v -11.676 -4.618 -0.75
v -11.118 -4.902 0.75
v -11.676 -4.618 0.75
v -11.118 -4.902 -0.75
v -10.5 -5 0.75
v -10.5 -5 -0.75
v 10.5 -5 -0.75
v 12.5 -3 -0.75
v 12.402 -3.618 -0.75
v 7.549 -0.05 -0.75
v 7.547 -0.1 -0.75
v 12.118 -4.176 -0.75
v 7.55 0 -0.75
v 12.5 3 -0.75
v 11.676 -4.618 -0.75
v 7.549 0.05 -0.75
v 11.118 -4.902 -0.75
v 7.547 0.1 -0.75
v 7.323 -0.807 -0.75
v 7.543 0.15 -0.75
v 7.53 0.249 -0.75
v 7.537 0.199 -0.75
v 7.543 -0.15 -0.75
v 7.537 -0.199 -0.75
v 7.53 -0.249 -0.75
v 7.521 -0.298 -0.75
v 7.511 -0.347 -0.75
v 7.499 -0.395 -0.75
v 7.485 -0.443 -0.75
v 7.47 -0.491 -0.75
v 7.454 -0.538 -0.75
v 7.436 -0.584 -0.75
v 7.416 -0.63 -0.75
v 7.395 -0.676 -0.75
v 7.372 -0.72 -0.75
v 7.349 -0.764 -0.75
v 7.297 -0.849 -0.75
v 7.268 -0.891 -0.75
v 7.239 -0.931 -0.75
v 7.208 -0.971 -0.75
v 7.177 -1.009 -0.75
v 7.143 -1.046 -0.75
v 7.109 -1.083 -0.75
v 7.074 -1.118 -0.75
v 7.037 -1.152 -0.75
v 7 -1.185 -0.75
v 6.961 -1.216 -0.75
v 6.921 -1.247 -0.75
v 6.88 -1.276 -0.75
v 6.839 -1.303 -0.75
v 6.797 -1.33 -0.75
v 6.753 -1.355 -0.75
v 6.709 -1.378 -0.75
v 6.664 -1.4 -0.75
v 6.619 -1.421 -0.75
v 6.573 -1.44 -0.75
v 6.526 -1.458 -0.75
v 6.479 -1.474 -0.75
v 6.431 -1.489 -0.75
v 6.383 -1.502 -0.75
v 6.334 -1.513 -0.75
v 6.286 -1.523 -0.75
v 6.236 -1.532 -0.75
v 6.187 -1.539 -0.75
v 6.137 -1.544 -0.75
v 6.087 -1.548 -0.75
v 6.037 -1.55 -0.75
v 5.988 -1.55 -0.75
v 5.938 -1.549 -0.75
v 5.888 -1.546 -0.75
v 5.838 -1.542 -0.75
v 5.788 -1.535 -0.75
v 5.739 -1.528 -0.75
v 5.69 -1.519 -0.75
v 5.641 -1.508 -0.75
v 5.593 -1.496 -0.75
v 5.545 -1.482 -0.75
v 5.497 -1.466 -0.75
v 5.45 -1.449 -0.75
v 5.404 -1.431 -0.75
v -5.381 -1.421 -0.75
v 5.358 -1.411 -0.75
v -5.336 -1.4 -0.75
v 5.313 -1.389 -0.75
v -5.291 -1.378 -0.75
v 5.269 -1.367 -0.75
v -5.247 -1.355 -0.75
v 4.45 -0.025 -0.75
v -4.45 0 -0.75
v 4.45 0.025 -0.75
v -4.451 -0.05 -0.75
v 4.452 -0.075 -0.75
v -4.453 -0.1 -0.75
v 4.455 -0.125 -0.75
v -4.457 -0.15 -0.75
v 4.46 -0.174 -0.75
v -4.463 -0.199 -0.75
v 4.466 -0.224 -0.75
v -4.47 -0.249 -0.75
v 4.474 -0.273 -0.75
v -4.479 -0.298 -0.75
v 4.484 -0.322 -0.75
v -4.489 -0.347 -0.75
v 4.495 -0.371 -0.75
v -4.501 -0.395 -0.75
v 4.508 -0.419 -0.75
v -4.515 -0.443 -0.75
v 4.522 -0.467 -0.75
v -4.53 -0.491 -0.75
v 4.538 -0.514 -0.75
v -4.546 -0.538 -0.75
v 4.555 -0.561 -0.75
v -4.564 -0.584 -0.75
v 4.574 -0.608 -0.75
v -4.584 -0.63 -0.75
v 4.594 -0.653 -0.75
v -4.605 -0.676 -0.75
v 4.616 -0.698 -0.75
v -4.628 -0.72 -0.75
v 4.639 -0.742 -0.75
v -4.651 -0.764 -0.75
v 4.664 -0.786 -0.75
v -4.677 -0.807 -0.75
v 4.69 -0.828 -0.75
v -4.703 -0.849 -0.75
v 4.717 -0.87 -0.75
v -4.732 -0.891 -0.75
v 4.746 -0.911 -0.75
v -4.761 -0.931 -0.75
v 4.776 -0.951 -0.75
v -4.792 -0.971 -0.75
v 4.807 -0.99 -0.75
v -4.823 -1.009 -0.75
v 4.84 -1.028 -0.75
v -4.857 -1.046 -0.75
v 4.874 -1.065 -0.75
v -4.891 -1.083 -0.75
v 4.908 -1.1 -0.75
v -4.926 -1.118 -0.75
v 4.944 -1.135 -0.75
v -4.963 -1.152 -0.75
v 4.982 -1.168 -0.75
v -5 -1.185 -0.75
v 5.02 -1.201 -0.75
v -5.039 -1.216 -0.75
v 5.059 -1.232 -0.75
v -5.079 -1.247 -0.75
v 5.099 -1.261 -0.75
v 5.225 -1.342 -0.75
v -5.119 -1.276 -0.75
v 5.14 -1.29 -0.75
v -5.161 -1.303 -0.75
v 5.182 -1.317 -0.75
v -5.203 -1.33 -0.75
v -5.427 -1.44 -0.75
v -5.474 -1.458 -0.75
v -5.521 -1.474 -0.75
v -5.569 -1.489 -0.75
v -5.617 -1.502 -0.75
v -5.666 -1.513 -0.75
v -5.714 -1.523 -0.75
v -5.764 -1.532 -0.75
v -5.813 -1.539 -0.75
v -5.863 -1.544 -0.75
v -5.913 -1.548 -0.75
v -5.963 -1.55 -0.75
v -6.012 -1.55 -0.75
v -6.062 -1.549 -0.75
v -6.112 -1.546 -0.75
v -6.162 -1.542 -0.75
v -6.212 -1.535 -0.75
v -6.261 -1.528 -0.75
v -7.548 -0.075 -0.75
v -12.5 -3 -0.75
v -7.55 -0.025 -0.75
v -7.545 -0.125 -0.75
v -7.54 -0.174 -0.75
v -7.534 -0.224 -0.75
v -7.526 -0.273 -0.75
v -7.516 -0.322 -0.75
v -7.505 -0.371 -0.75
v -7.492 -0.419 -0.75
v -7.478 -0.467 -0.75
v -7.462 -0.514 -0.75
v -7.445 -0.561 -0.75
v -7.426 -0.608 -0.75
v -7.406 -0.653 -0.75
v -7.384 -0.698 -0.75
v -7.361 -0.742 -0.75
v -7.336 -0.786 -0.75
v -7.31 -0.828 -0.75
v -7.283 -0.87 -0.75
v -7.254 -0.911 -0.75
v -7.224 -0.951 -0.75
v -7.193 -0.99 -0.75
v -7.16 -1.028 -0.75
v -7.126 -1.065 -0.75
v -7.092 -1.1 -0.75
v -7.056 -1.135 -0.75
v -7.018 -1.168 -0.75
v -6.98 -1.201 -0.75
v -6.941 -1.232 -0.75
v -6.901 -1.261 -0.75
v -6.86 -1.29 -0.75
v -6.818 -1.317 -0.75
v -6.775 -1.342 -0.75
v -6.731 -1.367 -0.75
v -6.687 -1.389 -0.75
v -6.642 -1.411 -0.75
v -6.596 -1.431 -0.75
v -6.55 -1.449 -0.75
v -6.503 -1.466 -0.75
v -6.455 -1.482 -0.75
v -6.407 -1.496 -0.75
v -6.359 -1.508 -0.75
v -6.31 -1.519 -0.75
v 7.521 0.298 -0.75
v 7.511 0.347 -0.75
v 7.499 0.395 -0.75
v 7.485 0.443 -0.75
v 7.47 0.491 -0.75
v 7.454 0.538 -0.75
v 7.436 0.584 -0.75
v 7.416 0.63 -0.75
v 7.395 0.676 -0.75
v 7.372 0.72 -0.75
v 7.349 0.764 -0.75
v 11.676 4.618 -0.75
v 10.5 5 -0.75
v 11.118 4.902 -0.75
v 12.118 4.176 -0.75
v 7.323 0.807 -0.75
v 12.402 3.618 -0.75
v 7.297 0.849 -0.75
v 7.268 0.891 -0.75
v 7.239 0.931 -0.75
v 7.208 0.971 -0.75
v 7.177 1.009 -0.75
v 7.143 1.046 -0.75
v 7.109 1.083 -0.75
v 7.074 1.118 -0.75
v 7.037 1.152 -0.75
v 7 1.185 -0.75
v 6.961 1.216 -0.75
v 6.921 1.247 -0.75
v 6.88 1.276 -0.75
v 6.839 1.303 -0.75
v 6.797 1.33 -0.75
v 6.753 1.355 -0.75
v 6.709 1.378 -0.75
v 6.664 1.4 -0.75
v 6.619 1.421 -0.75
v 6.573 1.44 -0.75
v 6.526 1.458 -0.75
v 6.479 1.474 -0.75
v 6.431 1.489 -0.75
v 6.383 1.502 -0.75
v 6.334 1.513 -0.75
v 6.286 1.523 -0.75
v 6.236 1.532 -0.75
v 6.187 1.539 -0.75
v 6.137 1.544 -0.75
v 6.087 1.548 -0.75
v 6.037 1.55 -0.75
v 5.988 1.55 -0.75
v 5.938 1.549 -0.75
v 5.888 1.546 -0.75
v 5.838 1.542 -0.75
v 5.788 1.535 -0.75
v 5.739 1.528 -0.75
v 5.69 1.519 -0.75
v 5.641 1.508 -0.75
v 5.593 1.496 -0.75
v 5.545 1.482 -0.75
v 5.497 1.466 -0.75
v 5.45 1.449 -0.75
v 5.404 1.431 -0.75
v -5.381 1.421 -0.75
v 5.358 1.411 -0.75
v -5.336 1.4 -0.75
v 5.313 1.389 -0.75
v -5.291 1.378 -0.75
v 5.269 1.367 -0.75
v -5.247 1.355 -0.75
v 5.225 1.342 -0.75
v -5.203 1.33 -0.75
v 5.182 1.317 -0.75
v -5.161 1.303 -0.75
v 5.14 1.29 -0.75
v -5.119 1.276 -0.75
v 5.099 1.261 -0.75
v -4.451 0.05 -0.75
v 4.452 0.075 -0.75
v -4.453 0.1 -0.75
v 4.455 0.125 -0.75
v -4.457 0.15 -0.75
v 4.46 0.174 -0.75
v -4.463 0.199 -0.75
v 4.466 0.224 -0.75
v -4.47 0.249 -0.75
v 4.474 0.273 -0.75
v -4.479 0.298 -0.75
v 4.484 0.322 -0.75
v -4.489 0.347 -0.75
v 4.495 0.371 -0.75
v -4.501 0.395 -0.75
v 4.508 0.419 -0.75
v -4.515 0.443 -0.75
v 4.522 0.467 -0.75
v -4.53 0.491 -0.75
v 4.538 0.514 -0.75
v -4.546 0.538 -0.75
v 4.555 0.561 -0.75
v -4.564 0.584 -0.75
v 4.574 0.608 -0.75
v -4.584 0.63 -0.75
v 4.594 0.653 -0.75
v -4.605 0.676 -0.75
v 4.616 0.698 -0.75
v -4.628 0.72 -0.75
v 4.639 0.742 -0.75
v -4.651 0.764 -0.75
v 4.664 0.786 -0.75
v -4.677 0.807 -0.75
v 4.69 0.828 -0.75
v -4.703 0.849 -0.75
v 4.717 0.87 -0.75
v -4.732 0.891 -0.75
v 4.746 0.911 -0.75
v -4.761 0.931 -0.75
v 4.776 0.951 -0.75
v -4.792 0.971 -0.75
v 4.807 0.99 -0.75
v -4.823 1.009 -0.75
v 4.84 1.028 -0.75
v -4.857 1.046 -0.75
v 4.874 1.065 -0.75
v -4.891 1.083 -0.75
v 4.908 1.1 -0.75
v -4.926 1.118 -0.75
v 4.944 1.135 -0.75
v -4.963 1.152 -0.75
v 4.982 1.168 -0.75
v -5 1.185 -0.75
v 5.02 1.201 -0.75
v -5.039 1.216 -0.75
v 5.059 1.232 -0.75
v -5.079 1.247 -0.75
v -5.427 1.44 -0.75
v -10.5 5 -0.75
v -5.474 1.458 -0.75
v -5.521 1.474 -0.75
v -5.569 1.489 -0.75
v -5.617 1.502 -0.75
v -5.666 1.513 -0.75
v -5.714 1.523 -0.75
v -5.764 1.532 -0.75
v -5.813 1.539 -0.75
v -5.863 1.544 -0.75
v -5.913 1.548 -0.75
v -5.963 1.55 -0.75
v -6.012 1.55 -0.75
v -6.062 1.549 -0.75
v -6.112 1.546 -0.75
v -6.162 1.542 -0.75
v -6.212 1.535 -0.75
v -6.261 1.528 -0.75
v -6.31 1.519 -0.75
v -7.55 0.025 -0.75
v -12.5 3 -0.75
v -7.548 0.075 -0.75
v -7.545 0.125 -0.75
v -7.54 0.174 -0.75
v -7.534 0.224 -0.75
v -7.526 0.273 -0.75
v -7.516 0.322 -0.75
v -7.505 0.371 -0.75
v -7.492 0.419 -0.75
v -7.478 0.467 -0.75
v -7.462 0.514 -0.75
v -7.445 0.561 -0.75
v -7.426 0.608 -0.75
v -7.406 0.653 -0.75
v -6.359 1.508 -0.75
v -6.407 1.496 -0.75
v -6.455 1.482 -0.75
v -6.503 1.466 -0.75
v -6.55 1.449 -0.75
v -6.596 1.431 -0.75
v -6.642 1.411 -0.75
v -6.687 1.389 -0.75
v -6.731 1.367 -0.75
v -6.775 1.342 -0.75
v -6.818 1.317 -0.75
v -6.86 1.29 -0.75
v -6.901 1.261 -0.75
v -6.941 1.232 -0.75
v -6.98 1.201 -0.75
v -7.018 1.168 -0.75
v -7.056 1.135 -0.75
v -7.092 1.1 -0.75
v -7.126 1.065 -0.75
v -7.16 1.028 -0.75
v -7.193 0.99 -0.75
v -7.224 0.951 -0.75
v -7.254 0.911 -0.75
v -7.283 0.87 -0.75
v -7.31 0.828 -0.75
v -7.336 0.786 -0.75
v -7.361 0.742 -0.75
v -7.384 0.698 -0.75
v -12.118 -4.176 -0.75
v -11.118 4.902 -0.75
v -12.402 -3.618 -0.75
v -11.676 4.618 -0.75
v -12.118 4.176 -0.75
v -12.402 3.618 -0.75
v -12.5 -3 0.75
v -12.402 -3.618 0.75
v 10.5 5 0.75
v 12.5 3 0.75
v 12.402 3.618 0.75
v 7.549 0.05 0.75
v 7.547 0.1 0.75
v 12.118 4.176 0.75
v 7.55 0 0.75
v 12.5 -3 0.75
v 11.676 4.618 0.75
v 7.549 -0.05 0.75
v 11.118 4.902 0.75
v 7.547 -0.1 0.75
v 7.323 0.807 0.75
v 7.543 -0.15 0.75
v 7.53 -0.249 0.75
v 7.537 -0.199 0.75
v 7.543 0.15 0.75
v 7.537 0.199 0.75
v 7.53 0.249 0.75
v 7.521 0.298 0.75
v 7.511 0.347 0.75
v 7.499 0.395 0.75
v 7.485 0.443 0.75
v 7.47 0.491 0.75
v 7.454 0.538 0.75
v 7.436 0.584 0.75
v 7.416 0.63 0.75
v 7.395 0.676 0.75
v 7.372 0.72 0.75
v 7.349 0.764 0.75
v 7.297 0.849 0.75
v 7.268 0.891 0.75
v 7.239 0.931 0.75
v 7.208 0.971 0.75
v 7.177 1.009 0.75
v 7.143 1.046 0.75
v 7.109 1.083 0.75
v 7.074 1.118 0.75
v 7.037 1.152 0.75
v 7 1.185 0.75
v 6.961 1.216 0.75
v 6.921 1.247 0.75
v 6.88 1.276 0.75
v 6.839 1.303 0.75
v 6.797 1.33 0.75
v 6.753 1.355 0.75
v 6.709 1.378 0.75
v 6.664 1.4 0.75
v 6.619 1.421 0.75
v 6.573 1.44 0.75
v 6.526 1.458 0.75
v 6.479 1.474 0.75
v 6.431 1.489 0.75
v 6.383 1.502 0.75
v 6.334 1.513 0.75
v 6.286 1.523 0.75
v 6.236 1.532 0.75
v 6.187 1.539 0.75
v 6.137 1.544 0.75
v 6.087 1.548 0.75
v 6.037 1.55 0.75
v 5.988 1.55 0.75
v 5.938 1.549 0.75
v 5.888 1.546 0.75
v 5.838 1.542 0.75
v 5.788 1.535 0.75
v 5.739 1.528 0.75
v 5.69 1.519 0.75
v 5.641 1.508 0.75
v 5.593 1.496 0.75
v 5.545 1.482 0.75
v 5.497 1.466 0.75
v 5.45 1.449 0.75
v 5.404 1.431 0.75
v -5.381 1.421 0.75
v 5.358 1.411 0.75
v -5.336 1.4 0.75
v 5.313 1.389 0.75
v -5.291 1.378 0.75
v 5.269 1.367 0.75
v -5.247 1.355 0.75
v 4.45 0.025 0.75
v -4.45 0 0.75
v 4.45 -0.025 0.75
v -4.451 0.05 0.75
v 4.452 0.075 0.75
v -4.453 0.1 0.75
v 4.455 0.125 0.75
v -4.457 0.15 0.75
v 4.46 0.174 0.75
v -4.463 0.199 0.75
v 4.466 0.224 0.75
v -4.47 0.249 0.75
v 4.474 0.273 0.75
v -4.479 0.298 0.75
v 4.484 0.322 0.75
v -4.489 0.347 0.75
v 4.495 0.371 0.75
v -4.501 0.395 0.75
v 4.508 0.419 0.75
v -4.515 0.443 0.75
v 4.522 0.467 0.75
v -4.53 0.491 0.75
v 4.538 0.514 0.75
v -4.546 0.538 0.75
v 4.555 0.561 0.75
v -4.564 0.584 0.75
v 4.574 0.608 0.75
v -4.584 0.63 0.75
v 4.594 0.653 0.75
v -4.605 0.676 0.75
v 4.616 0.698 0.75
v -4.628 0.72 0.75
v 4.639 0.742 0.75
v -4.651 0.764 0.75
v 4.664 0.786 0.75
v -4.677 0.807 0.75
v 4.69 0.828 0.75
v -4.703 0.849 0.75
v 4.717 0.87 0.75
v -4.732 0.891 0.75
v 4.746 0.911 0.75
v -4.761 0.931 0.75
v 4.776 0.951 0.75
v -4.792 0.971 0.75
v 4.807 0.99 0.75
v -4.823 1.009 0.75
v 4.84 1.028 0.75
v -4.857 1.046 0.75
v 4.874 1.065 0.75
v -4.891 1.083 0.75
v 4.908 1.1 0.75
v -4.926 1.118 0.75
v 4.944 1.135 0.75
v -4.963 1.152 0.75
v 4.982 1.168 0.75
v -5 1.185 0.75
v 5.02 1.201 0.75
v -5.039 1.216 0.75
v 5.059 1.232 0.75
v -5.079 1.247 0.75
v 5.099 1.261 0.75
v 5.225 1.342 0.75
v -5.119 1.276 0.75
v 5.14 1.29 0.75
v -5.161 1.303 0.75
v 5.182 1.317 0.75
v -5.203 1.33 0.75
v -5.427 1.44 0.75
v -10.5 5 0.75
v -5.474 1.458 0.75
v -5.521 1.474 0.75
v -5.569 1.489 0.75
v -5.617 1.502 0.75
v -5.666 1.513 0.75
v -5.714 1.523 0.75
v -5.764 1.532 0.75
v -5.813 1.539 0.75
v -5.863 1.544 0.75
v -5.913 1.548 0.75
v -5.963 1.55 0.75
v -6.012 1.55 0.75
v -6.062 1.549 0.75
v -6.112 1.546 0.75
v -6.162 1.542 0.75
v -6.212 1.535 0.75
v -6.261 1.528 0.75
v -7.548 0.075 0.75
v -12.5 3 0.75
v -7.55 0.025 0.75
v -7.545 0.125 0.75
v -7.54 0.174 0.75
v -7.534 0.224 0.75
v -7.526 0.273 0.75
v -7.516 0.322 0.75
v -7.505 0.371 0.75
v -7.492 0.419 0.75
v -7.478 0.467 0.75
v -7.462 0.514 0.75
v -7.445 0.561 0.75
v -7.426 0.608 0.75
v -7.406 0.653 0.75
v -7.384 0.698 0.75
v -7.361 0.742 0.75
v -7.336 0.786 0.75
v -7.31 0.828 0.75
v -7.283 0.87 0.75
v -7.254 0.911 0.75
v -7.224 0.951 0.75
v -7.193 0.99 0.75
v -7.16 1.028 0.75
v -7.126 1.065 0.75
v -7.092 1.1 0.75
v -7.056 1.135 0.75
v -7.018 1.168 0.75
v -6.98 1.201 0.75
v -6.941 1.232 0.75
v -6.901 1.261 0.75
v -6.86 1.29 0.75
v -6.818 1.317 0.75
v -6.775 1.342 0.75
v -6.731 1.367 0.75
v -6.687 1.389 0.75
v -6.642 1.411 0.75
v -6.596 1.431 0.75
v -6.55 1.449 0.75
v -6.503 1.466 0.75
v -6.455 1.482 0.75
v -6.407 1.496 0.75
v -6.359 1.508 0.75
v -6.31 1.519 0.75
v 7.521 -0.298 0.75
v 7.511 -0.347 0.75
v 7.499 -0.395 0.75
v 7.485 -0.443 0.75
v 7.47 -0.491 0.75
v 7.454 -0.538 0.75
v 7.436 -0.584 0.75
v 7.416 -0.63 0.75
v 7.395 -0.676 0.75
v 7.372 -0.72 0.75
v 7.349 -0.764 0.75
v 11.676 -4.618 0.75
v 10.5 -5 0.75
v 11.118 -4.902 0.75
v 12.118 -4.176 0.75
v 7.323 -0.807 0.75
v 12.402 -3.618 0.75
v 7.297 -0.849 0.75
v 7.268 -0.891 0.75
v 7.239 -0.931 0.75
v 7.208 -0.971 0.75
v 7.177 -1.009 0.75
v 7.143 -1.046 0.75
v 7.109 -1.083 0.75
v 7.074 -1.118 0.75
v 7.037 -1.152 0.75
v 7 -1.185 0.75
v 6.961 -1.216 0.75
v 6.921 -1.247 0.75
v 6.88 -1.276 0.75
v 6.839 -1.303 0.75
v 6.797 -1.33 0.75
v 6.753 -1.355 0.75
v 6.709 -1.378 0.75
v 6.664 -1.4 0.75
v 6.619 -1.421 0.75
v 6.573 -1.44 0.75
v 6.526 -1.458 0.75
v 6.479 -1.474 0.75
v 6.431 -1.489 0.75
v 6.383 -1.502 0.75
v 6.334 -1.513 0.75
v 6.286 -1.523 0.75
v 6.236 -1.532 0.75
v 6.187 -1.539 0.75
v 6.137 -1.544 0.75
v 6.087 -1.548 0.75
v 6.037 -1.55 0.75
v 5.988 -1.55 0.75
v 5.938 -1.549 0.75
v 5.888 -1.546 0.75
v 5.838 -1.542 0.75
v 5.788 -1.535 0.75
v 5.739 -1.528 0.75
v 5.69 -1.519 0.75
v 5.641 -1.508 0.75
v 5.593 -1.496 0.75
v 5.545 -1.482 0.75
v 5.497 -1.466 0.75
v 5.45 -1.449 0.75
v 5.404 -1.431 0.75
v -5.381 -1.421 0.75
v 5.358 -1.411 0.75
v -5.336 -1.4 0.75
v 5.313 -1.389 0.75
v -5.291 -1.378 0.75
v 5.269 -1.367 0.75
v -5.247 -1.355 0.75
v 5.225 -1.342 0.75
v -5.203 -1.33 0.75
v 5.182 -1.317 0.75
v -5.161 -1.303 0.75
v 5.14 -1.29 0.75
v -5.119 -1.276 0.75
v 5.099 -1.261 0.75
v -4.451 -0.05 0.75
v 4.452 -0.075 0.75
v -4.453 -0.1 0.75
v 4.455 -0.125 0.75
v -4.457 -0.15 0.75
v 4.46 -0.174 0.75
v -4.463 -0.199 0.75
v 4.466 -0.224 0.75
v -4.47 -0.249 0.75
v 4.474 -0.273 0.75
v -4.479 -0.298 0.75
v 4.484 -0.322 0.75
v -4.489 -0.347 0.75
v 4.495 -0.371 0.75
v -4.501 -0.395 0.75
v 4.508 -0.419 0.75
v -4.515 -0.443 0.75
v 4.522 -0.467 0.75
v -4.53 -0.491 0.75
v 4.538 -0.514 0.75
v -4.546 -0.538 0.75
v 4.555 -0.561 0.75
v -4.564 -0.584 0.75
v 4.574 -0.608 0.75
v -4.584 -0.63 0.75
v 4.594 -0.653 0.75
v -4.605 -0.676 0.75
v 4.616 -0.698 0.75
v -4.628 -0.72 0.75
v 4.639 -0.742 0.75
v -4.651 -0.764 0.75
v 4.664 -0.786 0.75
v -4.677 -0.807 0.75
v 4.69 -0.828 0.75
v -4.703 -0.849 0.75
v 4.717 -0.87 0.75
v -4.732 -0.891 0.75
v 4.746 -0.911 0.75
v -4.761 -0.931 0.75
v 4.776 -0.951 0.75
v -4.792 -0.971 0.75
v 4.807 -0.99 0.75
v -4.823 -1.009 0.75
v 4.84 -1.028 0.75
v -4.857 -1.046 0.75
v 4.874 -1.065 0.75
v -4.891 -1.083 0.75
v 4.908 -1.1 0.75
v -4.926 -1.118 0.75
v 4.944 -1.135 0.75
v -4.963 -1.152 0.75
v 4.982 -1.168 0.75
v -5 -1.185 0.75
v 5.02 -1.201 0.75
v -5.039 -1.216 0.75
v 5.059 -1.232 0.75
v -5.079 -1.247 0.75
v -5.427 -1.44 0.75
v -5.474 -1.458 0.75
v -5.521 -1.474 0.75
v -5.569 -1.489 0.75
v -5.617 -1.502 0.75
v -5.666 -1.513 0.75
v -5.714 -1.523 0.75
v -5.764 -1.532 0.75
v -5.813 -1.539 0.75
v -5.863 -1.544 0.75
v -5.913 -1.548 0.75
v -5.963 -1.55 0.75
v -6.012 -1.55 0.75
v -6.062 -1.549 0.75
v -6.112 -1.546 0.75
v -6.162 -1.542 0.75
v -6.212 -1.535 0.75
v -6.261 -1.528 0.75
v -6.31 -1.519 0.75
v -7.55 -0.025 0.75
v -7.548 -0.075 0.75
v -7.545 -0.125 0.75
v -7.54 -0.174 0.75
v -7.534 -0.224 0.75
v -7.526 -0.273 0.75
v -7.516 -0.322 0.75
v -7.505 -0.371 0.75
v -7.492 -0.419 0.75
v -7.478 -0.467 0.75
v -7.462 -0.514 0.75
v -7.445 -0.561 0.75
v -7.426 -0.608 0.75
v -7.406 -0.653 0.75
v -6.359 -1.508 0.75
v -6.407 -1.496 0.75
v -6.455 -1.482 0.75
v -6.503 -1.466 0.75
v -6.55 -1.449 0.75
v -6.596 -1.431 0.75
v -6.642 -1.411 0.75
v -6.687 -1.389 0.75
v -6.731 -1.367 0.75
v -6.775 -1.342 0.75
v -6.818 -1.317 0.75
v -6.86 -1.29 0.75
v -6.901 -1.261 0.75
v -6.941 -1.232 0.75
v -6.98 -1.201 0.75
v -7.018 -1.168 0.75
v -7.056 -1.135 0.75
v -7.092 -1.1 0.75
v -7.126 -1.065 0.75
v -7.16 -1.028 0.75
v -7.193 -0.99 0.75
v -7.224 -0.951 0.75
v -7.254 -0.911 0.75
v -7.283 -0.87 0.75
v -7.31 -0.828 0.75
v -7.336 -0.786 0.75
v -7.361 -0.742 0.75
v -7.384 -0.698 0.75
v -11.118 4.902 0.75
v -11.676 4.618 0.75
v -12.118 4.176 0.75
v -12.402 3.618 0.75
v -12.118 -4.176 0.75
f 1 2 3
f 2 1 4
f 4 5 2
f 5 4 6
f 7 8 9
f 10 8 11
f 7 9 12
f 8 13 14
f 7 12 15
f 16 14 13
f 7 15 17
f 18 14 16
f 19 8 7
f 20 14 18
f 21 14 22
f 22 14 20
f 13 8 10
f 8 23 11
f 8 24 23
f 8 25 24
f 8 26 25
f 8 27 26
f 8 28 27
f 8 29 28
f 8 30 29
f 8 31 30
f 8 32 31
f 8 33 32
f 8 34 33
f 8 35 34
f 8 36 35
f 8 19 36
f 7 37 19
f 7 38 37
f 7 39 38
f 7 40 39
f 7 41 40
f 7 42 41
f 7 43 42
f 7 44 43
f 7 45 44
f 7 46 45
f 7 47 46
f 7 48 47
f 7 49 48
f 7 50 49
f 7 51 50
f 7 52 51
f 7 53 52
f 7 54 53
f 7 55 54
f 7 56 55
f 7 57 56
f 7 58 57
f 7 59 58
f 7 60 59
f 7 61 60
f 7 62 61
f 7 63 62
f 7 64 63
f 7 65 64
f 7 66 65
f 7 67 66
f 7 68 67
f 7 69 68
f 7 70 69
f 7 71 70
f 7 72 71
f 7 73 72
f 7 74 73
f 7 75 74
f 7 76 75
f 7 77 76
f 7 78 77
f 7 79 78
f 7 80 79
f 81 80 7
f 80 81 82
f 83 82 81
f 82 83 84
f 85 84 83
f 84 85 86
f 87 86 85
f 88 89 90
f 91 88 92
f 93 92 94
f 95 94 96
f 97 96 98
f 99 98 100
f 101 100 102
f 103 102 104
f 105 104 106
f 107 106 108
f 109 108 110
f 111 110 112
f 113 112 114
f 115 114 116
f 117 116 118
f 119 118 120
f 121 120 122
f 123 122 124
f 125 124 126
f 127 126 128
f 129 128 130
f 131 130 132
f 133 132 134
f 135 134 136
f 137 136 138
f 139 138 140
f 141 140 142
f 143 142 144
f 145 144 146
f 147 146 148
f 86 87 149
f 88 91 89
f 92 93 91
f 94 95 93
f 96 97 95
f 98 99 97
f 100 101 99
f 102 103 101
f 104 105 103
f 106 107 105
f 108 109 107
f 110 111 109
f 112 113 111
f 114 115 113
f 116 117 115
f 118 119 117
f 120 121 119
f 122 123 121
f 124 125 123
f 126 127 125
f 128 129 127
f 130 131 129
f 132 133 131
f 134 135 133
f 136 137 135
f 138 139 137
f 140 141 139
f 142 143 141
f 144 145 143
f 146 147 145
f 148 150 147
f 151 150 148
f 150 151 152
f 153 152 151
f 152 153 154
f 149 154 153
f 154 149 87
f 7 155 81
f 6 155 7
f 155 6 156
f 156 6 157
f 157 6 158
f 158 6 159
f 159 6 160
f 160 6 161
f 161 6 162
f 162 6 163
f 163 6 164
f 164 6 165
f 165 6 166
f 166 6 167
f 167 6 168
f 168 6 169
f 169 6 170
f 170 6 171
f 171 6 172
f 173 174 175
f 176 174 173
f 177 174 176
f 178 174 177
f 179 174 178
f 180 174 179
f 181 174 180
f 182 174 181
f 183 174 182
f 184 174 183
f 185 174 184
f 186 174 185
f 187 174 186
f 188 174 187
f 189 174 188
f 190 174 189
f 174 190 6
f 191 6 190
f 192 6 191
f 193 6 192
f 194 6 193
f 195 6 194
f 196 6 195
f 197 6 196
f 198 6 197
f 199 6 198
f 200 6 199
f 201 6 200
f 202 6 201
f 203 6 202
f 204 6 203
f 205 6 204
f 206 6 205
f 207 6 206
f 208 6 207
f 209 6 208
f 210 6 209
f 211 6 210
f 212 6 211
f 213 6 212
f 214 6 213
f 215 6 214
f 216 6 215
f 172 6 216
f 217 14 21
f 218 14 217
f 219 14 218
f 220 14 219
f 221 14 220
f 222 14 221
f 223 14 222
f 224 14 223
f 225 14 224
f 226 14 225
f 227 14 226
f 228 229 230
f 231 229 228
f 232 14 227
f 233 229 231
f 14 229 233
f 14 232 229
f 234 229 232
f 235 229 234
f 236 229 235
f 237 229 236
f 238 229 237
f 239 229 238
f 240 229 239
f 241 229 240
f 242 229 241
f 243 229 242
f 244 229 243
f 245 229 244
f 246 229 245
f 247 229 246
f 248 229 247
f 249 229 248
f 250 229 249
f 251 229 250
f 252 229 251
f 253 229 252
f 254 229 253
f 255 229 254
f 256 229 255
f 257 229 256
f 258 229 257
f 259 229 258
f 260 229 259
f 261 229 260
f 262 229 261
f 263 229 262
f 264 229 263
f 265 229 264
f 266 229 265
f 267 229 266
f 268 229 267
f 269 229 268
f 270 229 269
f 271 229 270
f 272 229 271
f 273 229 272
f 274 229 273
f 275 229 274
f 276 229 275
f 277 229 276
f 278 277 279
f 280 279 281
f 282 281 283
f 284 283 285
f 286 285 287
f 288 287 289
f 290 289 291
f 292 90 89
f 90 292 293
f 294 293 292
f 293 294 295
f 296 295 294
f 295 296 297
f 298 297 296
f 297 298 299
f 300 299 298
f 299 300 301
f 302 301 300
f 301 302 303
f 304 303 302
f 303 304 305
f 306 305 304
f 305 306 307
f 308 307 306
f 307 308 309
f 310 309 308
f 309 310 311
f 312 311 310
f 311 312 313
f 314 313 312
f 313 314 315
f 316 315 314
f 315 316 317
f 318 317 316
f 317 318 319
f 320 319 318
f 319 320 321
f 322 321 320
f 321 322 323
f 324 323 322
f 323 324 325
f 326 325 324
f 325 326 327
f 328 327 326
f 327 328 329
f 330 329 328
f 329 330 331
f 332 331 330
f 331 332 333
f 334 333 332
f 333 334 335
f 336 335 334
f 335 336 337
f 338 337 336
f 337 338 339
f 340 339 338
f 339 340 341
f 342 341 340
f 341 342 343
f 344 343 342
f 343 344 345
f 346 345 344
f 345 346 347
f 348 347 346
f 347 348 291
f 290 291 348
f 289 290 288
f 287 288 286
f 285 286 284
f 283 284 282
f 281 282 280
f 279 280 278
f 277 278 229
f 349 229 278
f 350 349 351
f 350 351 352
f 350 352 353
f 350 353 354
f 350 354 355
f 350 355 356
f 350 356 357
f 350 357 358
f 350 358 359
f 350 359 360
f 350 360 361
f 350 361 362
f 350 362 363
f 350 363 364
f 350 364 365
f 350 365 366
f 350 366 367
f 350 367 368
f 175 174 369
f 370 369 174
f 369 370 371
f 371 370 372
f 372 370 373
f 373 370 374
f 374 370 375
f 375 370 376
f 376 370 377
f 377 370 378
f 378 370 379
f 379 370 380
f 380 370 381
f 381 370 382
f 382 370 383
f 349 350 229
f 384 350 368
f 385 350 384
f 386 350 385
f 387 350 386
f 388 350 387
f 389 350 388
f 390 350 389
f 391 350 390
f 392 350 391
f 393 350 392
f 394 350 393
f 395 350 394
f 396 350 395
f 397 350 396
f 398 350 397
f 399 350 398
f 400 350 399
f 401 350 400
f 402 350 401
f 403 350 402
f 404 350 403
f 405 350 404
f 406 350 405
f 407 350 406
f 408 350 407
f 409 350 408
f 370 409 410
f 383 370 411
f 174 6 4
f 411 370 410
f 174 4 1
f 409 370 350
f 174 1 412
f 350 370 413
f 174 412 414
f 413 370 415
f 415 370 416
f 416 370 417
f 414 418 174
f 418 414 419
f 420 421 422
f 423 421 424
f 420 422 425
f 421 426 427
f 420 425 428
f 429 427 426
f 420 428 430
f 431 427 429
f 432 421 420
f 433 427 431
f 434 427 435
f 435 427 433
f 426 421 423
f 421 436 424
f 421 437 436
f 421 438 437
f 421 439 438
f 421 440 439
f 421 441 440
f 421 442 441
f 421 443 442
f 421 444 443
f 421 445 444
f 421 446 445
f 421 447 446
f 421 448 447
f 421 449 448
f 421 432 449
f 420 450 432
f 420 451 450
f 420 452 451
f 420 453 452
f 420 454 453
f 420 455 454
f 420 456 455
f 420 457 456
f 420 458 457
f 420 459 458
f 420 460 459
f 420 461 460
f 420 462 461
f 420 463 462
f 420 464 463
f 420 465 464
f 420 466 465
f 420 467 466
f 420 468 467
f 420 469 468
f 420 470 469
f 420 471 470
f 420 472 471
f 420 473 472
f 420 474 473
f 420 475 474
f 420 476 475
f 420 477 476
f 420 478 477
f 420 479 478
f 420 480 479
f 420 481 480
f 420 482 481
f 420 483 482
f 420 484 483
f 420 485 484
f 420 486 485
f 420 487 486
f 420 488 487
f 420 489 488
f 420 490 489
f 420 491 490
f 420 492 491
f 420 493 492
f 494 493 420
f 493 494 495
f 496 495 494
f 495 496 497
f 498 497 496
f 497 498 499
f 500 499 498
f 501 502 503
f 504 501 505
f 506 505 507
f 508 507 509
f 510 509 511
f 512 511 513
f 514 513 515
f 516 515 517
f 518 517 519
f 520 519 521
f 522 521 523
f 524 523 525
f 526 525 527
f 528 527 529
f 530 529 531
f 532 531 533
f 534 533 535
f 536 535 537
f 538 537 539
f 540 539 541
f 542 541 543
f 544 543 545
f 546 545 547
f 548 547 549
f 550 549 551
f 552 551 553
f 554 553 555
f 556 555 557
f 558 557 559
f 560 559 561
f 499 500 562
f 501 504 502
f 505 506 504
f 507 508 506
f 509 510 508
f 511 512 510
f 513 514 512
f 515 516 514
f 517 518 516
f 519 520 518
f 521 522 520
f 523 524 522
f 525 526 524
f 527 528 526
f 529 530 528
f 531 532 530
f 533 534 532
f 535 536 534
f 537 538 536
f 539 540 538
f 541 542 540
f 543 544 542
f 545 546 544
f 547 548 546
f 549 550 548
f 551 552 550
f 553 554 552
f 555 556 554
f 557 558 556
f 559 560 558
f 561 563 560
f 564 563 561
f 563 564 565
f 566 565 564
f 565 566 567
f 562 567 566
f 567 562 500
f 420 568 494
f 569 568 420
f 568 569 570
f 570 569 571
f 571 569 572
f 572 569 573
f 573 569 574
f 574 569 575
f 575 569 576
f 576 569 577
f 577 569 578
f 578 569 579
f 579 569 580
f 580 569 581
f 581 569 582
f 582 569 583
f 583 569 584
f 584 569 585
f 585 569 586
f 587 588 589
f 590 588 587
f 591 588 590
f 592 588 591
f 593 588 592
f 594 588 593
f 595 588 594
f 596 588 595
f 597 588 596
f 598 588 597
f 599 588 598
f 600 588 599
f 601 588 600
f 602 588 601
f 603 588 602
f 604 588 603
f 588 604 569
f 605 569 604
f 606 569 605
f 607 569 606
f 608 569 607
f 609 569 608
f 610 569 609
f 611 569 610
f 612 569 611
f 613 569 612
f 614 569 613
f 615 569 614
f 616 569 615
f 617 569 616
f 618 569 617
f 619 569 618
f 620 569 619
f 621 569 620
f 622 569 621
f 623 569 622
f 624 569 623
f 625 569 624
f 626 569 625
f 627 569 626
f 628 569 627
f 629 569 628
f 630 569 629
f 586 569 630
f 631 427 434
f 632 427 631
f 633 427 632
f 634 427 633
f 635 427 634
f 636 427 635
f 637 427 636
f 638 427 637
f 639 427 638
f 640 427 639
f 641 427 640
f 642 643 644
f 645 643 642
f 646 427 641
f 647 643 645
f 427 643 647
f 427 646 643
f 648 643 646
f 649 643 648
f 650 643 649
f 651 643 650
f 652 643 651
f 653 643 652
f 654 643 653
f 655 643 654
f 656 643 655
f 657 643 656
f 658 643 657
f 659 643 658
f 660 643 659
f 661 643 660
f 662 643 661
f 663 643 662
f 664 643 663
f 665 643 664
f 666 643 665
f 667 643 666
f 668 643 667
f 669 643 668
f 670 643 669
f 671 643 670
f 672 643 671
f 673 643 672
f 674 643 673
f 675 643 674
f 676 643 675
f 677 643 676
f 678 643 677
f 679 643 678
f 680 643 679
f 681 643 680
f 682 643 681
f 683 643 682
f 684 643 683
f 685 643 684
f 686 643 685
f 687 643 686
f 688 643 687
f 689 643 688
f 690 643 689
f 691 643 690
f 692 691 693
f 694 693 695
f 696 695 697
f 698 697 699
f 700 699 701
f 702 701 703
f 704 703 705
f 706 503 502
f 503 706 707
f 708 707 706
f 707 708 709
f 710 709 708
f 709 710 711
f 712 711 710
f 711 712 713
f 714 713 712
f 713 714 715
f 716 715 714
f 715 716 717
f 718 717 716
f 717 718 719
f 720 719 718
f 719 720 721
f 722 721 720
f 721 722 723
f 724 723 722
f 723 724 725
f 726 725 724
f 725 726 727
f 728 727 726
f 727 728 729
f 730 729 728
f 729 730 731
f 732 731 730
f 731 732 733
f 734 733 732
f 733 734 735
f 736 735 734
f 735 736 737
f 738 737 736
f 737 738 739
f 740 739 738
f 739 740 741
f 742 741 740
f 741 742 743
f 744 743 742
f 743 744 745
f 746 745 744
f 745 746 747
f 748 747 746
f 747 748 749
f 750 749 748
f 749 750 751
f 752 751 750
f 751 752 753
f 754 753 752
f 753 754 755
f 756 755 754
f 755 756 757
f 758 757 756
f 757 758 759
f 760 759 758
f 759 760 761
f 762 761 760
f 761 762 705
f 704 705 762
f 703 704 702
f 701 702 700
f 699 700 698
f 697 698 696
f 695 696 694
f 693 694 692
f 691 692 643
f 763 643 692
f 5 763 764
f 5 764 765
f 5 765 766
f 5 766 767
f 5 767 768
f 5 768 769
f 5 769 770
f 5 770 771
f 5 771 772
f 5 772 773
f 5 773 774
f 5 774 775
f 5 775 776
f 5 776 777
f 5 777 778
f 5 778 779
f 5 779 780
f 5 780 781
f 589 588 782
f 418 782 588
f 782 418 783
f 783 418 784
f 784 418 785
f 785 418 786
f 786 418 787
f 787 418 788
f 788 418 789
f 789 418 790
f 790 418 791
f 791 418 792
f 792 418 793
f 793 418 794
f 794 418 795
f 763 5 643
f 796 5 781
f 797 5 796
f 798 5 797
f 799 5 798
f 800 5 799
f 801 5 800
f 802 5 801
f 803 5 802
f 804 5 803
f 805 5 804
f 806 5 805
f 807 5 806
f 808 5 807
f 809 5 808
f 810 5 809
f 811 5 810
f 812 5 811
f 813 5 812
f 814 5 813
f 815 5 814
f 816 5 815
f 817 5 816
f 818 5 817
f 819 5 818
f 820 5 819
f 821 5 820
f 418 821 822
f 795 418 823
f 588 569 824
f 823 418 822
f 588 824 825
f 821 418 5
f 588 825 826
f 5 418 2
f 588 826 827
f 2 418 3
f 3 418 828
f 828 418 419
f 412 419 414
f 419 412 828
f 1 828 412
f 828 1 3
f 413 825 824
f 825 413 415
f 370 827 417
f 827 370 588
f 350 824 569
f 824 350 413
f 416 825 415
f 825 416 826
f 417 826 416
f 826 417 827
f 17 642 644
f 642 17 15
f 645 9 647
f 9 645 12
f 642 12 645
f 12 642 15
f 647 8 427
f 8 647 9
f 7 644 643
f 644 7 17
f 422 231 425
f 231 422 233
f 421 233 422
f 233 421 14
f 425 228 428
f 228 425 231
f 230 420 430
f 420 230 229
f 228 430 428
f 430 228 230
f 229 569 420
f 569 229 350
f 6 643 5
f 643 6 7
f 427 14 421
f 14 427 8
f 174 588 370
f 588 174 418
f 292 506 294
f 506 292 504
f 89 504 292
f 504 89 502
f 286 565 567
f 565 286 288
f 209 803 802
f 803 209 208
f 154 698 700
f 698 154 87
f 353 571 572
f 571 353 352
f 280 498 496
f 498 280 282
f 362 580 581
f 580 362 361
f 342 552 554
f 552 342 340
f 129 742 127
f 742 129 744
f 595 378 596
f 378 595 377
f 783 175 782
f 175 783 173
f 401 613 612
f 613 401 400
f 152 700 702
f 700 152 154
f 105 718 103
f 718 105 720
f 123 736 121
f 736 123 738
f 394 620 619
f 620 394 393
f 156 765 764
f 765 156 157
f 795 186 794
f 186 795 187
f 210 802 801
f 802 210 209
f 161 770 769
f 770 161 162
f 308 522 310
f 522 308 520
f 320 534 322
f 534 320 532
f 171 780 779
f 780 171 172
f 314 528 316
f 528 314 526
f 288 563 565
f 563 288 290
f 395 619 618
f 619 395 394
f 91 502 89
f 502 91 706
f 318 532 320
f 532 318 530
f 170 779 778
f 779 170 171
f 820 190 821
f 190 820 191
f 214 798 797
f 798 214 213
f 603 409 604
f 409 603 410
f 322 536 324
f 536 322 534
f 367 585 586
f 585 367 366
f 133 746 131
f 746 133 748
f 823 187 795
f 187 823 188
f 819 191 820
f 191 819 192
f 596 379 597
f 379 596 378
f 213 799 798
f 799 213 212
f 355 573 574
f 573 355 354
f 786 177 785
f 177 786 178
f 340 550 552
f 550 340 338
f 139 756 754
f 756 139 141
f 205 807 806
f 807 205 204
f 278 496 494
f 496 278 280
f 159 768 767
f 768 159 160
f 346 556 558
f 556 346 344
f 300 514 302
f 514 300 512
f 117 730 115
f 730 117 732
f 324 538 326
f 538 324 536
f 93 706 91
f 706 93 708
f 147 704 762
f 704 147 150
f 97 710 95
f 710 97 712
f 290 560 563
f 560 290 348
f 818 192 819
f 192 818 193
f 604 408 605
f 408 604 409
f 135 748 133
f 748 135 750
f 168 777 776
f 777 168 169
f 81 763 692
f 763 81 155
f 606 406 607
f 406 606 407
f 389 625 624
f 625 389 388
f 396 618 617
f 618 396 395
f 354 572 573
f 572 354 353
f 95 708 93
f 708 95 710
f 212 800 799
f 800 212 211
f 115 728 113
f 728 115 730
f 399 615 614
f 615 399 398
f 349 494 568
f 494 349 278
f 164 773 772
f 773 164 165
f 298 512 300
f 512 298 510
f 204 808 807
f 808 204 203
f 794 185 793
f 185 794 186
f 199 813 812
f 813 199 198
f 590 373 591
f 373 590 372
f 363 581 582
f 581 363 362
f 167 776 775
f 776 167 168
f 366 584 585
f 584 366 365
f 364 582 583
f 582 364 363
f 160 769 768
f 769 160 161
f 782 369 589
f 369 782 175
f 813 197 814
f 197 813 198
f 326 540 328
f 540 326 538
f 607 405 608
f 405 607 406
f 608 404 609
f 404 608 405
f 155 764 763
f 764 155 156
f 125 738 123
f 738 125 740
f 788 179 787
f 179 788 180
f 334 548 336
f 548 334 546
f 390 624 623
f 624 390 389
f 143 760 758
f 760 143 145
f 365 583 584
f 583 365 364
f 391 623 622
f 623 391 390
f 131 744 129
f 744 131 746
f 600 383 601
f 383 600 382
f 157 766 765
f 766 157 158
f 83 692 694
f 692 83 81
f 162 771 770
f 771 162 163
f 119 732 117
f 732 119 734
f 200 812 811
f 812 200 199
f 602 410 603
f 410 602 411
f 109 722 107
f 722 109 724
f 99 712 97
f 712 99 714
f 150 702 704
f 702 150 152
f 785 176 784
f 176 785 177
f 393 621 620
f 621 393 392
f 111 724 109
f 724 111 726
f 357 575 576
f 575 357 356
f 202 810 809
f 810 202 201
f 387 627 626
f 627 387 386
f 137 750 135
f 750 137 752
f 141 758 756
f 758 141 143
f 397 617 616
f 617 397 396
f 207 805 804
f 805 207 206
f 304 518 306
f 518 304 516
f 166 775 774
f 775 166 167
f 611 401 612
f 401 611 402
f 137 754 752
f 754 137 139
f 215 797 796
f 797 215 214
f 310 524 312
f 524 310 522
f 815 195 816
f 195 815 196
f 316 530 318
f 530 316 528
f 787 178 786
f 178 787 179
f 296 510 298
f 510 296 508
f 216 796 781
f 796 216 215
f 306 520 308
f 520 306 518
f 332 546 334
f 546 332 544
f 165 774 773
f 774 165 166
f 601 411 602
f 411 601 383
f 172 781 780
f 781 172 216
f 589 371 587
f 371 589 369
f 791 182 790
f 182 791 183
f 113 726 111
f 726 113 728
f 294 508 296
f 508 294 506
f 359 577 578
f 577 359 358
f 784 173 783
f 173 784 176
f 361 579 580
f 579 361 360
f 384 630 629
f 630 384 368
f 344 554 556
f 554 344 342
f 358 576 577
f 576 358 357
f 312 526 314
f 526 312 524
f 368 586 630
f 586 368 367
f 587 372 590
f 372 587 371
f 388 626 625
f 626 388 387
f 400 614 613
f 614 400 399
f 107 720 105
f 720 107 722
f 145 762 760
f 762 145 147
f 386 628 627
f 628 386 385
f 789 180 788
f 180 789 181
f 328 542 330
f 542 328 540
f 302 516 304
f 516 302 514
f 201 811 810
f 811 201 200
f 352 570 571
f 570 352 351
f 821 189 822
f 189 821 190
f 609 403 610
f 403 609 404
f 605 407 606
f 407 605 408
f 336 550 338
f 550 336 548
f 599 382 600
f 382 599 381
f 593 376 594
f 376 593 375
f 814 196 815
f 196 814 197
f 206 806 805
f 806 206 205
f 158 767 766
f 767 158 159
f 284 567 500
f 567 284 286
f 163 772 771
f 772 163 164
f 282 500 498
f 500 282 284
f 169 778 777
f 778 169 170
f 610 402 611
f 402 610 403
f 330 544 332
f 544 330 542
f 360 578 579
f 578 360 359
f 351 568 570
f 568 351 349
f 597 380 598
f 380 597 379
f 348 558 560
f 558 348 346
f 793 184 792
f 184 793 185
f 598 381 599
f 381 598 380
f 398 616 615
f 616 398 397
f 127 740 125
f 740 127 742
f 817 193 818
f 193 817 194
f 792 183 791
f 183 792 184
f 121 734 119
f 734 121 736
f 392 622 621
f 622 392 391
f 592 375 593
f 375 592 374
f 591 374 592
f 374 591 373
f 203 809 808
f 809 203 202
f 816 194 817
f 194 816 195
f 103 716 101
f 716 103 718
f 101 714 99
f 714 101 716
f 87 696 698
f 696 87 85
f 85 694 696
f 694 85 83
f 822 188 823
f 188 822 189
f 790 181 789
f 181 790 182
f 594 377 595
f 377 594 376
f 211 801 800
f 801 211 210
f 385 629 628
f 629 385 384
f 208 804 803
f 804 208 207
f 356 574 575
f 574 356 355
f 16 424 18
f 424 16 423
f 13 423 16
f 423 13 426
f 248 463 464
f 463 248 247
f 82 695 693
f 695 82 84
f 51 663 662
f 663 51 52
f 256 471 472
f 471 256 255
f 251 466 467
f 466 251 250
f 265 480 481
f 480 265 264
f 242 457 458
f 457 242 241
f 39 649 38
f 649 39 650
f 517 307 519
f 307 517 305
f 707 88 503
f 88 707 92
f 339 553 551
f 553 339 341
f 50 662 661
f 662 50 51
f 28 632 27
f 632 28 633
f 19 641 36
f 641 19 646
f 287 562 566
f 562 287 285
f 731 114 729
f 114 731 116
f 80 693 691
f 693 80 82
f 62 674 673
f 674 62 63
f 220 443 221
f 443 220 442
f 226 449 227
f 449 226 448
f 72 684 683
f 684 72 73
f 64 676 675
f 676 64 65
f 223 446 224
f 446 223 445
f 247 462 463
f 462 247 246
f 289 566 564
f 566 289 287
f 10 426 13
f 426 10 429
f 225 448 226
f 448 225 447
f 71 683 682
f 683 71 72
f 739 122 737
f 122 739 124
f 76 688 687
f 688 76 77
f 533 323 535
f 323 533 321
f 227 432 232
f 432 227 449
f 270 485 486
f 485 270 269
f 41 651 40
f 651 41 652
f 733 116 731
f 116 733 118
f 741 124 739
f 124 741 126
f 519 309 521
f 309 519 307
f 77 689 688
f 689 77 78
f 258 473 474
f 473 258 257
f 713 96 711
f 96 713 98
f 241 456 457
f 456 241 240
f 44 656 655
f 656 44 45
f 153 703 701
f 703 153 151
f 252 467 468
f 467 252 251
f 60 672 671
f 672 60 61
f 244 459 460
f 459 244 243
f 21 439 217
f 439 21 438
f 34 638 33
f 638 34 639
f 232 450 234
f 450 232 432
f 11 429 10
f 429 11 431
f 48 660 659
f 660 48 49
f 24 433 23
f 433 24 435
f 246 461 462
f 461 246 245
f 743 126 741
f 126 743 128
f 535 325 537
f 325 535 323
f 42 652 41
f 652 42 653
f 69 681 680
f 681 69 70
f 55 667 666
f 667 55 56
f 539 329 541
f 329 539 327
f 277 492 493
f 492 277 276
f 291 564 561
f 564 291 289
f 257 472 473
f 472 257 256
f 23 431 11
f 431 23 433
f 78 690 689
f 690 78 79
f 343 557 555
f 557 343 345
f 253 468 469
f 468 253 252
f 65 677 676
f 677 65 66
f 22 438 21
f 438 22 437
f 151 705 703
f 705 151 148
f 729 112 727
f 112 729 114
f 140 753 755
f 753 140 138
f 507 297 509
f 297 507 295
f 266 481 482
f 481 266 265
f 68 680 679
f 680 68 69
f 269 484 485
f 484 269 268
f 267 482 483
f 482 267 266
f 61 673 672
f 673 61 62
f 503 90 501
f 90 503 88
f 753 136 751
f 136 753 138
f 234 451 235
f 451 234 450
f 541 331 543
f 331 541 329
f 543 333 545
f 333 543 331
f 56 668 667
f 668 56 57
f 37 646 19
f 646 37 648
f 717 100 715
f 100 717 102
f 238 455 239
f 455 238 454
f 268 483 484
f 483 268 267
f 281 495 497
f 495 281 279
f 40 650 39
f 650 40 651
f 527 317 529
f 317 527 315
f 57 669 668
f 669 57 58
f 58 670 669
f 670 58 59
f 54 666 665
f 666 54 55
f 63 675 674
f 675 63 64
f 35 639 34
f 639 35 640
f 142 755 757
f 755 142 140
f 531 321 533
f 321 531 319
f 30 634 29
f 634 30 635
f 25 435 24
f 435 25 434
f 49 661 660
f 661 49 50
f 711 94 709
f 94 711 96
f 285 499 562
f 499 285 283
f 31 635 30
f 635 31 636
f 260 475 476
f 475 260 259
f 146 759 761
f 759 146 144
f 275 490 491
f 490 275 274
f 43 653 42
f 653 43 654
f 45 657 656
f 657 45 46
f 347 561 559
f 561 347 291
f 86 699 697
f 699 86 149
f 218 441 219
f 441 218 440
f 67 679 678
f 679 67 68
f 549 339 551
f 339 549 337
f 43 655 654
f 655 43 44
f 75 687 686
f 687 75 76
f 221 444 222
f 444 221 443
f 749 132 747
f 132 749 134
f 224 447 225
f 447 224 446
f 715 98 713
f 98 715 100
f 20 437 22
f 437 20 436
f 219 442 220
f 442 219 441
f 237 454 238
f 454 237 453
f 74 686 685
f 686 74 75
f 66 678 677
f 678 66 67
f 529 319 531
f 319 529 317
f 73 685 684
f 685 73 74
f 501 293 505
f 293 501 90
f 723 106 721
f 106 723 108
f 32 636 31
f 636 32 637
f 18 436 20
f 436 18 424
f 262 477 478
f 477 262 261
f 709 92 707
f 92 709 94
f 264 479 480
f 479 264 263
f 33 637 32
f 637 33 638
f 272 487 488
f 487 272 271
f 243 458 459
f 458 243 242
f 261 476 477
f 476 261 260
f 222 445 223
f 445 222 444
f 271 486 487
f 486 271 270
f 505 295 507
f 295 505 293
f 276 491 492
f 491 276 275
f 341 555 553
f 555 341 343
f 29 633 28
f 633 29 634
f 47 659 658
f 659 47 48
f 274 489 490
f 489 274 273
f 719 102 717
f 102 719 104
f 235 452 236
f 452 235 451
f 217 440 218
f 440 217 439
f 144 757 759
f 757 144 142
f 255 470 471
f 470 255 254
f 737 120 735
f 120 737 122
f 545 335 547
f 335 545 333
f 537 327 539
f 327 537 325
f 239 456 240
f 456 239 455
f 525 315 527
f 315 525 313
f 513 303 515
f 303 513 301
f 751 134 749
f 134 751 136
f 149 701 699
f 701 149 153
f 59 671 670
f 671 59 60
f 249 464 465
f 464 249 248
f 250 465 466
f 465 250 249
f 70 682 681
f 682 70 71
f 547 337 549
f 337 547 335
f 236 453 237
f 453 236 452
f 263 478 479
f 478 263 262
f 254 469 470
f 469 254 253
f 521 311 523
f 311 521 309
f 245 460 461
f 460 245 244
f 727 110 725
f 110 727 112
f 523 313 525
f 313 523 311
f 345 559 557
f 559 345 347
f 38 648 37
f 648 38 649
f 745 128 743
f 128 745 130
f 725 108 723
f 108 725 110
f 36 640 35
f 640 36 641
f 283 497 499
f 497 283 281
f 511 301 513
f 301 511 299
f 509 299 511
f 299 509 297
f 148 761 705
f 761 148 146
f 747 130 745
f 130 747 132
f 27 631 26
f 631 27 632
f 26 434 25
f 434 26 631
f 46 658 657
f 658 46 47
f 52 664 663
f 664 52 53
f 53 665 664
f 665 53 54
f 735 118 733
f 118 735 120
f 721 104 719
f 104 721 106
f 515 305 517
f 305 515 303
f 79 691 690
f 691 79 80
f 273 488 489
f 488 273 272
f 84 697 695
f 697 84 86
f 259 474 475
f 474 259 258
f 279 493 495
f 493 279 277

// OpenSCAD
// air tripper spring block

use <MCAD/boxes.scad>;

module springBlock(screwDiam = 3.1, thickness=1.5){
    difference(){
        roundedBox([25,10,thickness],2,true,$fn=20);
        
        holeSep = 12;
        for(i=[-1,1]){
            translate([holeSep/2*i,0,0]) cylinder(d=screwDiam, h=thickness+1,center=true,$fa=0.05,$fs=0.05);
        }
    }
}
springBlock();
